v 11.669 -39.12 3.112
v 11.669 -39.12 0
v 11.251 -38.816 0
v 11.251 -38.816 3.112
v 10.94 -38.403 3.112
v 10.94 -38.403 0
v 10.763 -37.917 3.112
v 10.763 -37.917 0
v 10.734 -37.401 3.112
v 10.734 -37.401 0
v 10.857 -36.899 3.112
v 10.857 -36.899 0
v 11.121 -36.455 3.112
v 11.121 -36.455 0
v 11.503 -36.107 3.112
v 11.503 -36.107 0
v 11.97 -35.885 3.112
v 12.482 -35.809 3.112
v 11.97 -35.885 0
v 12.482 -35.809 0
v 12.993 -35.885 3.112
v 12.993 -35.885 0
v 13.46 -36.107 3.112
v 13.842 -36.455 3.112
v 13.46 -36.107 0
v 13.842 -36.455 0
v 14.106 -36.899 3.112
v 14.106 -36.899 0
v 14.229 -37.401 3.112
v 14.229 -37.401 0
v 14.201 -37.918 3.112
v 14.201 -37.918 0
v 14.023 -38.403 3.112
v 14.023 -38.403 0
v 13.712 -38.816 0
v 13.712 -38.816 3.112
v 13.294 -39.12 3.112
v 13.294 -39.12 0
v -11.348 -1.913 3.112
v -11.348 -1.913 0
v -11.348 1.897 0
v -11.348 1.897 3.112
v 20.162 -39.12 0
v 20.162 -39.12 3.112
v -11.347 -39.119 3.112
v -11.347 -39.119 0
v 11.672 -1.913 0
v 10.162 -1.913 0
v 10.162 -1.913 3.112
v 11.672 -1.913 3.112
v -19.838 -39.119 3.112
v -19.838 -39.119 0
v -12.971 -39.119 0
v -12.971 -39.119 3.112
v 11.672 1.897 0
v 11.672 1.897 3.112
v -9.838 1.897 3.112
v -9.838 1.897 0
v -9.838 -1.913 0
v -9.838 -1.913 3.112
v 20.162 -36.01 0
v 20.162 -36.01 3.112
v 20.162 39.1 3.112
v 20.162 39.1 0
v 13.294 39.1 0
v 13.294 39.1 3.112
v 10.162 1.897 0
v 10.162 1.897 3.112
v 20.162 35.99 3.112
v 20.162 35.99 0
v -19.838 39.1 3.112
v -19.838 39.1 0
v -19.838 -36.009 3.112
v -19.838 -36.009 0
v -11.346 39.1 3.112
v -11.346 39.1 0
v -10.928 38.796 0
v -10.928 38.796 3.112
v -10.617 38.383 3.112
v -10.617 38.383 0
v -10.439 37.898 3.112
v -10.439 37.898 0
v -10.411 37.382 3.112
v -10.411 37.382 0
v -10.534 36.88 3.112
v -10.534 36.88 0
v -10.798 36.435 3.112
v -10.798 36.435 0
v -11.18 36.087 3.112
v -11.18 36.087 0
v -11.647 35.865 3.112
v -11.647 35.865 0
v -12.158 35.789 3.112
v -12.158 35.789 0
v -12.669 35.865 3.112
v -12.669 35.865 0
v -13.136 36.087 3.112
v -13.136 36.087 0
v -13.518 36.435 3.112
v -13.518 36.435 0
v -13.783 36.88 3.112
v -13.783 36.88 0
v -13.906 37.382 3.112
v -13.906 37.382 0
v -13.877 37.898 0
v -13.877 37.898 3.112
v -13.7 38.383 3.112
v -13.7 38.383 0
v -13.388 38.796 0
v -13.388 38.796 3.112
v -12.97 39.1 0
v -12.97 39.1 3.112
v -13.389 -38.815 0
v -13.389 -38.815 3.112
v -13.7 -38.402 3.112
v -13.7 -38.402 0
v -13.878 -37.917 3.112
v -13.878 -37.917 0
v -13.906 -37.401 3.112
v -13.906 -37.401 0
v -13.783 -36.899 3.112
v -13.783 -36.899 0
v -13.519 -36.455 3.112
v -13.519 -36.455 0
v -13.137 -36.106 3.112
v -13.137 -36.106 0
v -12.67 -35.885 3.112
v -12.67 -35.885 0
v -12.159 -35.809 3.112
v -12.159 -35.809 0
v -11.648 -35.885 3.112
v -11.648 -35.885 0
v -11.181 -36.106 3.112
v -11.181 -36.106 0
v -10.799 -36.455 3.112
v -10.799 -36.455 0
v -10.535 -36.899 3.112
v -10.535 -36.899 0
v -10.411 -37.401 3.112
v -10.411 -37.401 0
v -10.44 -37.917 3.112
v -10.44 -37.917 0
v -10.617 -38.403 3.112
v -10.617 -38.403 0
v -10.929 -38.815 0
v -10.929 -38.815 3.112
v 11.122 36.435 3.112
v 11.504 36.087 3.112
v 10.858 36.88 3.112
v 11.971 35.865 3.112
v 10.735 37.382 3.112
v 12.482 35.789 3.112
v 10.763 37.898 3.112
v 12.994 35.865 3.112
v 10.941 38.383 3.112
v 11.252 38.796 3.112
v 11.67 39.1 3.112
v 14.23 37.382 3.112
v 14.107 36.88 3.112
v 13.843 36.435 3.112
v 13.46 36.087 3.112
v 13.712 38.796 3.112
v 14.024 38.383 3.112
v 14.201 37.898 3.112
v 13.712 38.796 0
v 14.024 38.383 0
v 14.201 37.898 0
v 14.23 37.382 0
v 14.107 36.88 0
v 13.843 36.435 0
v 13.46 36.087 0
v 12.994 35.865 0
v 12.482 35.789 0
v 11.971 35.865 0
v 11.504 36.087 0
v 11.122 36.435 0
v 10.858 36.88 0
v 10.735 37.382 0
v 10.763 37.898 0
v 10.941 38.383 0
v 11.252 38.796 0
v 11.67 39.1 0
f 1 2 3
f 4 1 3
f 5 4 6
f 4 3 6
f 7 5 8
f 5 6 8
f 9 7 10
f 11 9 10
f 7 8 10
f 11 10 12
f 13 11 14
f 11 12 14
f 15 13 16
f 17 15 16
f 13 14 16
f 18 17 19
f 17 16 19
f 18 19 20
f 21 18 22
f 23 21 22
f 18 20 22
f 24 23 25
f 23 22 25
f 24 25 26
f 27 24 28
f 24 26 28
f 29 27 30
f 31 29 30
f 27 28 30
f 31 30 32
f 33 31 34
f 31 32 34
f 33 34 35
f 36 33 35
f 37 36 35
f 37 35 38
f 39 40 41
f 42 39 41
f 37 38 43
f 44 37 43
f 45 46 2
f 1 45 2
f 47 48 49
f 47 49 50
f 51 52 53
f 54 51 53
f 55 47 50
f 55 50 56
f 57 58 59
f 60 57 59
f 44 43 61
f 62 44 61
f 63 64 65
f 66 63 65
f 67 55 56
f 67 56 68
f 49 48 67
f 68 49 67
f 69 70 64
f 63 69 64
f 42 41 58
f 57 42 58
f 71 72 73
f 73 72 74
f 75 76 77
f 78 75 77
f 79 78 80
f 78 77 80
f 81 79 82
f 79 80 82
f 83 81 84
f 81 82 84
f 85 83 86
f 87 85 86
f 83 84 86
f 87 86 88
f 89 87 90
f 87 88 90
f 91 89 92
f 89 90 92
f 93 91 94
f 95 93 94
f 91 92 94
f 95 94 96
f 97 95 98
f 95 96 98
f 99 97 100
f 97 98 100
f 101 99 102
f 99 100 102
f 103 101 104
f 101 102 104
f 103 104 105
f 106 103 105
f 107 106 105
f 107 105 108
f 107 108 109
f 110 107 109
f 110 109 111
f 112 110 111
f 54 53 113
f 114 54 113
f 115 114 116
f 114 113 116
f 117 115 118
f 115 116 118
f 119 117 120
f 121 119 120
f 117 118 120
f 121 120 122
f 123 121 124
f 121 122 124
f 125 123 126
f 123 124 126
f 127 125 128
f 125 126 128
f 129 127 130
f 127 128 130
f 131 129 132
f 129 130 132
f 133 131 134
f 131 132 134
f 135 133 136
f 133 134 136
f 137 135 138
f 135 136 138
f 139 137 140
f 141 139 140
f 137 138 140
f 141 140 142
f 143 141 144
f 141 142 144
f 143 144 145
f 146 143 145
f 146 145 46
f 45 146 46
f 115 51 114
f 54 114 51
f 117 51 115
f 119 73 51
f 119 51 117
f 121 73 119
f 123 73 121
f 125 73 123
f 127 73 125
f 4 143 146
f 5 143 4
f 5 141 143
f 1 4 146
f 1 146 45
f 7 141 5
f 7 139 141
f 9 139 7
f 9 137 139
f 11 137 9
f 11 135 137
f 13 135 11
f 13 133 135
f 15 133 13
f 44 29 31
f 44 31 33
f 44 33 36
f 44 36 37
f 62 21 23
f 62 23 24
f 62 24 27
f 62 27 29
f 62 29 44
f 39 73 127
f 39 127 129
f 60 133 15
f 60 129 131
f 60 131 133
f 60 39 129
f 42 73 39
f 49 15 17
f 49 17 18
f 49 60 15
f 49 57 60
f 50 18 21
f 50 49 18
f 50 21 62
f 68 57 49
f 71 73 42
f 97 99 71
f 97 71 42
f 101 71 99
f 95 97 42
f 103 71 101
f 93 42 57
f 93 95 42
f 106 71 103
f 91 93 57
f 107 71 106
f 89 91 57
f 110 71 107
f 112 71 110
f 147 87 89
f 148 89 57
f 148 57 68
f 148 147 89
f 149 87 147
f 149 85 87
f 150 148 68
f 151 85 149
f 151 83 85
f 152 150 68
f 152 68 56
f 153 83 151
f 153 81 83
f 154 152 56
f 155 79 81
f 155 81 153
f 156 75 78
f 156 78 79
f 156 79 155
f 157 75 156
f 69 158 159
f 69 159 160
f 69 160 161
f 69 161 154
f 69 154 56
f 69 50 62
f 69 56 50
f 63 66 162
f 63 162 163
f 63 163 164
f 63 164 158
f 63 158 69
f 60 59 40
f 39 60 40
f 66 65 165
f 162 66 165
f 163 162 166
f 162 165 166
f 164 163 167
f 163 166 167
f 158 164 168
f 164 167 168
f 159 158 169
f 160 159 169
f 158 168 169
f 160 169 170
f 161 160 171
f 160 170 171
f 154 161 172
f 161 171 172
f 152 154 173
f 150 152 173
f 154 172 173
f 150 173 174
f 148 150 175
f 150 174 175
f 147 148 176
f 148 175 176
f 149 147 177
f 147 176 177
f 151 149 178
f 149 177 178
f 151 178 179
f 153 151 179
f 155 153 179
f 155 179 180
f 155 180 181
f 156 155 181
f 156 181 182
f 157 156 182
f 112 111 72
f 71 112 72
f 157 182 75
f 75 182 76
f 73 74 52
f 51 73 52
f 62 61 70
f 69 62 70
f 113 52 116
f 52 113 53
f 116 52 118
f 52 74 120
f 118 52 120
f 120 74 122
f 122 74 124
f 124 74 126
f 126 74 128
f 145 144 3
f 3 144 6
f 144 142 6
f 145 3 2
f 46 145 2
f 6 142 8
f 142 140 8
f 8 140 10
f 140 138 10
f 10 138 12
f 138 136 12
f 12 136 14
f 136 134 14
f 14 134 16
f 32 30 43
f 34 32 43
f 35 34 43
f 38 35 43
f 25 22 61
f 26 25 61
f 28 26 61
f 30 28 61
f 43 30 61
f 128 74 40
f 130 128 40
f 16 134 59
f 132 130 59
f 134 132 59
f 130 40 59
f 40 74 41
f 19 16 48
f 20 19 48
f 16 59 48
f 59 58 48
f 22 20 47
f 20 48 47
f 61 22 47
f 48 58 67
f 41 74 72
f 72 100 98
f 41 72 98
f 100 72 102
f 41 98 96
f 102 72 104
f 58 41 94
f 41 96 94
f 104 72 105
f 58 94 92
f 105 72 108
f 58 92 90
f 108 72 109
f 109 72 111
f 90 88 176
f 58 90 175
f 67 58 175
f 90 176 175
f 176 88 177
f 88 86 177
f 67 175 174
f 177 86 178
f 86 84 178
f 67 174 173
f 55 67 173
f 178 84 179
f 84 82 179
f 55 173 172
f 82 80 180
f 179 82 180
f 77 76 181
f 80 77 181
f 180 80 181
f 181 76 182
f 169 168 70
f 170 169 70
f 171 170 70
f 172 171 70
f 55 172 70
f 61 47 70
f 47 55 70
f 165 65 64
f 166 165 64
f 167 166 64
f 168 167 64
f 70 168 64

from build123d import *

# Parameters (mm, degrees)
BOSS_EXTRUDE1_DEPTH = 3.1115


with BuildPart() as part:
    # Sketch1 → Boss-Extrude1 (new body)
    with BuildSketch(Plane.XY):
        with BuildLine():
            Line((-11.346747426, -39.119290122), (11.669367426, -39.119721696))
            ThreePointArc((11.669367426, -39.119721696), (12.481628508, -35.808987017), (13.293765431, -39.119752155))
            Line((13.293765431, -39.119752155), (20.161810992, -39.119880937))
            Line((20.161810992, -39.119880937), (20.161869308, -36.009880938))
            Line((20.161869308, -36.009880938), (20.162213663, 35.990119062))
            Line((20.162213663, 35.990119062), (20.162213663, 39.100119058))
            Line((20.162213663, 39.100119058), (13.352237556, 39.100119058))
            Line((13.352237556, 39.100119058), (13.294498779, 39.100119058))
            ThreePointArc((13.294498779, 39.100119058), (12.482299776, 35.789369149), (11.670100774, 39.100119058))
            Line((11.670100774, 39.100119058), (-11.346014082, 39.100119058))
            ThreePointArc((-11.346014082, 39.100119058), (-12.158213085, 35.789369149), (-12.970412087, 39.100119058))
            Line((-12.970412087, 39.100119058), (-19.837839981, 39.100119058))
            Line((-19.837839981, 39.100119058), (-19.837939244, -36.009130904))
            Line((-19.837939244, -36.009130904), (-19.837956649, -39.119130904))
            Line((-19.837956649, -39.119130904), (-12.97114543, -39.119259663))
            ThreePointArc((-12.97114543, -39.119259663), (-12.158884348, -35.808524984), (-11.346747426, -39.119290122))
        make_face()
        Polygon((10.162043346, -0.008380505), (10.162043346, -1.913380505), (11.672043346, -1.913380505), (11.672043346, 1.896619495), (10.162043346, 1.896619495), align=None, mode=Mode.SUBTRACT)
        Polygon((-9.837956654, 1.896619495), (-9.837956654, -0.008380505), (-9.837956654, -1.913380505), (-11.347956654, -1.913380505), (-11.347956654, 1.896619495), align=None, mode=Mode.SUBTRACT)
    extrude(amount=BOSS_EXTRUDE1_DEPTH)


solid = part.part
